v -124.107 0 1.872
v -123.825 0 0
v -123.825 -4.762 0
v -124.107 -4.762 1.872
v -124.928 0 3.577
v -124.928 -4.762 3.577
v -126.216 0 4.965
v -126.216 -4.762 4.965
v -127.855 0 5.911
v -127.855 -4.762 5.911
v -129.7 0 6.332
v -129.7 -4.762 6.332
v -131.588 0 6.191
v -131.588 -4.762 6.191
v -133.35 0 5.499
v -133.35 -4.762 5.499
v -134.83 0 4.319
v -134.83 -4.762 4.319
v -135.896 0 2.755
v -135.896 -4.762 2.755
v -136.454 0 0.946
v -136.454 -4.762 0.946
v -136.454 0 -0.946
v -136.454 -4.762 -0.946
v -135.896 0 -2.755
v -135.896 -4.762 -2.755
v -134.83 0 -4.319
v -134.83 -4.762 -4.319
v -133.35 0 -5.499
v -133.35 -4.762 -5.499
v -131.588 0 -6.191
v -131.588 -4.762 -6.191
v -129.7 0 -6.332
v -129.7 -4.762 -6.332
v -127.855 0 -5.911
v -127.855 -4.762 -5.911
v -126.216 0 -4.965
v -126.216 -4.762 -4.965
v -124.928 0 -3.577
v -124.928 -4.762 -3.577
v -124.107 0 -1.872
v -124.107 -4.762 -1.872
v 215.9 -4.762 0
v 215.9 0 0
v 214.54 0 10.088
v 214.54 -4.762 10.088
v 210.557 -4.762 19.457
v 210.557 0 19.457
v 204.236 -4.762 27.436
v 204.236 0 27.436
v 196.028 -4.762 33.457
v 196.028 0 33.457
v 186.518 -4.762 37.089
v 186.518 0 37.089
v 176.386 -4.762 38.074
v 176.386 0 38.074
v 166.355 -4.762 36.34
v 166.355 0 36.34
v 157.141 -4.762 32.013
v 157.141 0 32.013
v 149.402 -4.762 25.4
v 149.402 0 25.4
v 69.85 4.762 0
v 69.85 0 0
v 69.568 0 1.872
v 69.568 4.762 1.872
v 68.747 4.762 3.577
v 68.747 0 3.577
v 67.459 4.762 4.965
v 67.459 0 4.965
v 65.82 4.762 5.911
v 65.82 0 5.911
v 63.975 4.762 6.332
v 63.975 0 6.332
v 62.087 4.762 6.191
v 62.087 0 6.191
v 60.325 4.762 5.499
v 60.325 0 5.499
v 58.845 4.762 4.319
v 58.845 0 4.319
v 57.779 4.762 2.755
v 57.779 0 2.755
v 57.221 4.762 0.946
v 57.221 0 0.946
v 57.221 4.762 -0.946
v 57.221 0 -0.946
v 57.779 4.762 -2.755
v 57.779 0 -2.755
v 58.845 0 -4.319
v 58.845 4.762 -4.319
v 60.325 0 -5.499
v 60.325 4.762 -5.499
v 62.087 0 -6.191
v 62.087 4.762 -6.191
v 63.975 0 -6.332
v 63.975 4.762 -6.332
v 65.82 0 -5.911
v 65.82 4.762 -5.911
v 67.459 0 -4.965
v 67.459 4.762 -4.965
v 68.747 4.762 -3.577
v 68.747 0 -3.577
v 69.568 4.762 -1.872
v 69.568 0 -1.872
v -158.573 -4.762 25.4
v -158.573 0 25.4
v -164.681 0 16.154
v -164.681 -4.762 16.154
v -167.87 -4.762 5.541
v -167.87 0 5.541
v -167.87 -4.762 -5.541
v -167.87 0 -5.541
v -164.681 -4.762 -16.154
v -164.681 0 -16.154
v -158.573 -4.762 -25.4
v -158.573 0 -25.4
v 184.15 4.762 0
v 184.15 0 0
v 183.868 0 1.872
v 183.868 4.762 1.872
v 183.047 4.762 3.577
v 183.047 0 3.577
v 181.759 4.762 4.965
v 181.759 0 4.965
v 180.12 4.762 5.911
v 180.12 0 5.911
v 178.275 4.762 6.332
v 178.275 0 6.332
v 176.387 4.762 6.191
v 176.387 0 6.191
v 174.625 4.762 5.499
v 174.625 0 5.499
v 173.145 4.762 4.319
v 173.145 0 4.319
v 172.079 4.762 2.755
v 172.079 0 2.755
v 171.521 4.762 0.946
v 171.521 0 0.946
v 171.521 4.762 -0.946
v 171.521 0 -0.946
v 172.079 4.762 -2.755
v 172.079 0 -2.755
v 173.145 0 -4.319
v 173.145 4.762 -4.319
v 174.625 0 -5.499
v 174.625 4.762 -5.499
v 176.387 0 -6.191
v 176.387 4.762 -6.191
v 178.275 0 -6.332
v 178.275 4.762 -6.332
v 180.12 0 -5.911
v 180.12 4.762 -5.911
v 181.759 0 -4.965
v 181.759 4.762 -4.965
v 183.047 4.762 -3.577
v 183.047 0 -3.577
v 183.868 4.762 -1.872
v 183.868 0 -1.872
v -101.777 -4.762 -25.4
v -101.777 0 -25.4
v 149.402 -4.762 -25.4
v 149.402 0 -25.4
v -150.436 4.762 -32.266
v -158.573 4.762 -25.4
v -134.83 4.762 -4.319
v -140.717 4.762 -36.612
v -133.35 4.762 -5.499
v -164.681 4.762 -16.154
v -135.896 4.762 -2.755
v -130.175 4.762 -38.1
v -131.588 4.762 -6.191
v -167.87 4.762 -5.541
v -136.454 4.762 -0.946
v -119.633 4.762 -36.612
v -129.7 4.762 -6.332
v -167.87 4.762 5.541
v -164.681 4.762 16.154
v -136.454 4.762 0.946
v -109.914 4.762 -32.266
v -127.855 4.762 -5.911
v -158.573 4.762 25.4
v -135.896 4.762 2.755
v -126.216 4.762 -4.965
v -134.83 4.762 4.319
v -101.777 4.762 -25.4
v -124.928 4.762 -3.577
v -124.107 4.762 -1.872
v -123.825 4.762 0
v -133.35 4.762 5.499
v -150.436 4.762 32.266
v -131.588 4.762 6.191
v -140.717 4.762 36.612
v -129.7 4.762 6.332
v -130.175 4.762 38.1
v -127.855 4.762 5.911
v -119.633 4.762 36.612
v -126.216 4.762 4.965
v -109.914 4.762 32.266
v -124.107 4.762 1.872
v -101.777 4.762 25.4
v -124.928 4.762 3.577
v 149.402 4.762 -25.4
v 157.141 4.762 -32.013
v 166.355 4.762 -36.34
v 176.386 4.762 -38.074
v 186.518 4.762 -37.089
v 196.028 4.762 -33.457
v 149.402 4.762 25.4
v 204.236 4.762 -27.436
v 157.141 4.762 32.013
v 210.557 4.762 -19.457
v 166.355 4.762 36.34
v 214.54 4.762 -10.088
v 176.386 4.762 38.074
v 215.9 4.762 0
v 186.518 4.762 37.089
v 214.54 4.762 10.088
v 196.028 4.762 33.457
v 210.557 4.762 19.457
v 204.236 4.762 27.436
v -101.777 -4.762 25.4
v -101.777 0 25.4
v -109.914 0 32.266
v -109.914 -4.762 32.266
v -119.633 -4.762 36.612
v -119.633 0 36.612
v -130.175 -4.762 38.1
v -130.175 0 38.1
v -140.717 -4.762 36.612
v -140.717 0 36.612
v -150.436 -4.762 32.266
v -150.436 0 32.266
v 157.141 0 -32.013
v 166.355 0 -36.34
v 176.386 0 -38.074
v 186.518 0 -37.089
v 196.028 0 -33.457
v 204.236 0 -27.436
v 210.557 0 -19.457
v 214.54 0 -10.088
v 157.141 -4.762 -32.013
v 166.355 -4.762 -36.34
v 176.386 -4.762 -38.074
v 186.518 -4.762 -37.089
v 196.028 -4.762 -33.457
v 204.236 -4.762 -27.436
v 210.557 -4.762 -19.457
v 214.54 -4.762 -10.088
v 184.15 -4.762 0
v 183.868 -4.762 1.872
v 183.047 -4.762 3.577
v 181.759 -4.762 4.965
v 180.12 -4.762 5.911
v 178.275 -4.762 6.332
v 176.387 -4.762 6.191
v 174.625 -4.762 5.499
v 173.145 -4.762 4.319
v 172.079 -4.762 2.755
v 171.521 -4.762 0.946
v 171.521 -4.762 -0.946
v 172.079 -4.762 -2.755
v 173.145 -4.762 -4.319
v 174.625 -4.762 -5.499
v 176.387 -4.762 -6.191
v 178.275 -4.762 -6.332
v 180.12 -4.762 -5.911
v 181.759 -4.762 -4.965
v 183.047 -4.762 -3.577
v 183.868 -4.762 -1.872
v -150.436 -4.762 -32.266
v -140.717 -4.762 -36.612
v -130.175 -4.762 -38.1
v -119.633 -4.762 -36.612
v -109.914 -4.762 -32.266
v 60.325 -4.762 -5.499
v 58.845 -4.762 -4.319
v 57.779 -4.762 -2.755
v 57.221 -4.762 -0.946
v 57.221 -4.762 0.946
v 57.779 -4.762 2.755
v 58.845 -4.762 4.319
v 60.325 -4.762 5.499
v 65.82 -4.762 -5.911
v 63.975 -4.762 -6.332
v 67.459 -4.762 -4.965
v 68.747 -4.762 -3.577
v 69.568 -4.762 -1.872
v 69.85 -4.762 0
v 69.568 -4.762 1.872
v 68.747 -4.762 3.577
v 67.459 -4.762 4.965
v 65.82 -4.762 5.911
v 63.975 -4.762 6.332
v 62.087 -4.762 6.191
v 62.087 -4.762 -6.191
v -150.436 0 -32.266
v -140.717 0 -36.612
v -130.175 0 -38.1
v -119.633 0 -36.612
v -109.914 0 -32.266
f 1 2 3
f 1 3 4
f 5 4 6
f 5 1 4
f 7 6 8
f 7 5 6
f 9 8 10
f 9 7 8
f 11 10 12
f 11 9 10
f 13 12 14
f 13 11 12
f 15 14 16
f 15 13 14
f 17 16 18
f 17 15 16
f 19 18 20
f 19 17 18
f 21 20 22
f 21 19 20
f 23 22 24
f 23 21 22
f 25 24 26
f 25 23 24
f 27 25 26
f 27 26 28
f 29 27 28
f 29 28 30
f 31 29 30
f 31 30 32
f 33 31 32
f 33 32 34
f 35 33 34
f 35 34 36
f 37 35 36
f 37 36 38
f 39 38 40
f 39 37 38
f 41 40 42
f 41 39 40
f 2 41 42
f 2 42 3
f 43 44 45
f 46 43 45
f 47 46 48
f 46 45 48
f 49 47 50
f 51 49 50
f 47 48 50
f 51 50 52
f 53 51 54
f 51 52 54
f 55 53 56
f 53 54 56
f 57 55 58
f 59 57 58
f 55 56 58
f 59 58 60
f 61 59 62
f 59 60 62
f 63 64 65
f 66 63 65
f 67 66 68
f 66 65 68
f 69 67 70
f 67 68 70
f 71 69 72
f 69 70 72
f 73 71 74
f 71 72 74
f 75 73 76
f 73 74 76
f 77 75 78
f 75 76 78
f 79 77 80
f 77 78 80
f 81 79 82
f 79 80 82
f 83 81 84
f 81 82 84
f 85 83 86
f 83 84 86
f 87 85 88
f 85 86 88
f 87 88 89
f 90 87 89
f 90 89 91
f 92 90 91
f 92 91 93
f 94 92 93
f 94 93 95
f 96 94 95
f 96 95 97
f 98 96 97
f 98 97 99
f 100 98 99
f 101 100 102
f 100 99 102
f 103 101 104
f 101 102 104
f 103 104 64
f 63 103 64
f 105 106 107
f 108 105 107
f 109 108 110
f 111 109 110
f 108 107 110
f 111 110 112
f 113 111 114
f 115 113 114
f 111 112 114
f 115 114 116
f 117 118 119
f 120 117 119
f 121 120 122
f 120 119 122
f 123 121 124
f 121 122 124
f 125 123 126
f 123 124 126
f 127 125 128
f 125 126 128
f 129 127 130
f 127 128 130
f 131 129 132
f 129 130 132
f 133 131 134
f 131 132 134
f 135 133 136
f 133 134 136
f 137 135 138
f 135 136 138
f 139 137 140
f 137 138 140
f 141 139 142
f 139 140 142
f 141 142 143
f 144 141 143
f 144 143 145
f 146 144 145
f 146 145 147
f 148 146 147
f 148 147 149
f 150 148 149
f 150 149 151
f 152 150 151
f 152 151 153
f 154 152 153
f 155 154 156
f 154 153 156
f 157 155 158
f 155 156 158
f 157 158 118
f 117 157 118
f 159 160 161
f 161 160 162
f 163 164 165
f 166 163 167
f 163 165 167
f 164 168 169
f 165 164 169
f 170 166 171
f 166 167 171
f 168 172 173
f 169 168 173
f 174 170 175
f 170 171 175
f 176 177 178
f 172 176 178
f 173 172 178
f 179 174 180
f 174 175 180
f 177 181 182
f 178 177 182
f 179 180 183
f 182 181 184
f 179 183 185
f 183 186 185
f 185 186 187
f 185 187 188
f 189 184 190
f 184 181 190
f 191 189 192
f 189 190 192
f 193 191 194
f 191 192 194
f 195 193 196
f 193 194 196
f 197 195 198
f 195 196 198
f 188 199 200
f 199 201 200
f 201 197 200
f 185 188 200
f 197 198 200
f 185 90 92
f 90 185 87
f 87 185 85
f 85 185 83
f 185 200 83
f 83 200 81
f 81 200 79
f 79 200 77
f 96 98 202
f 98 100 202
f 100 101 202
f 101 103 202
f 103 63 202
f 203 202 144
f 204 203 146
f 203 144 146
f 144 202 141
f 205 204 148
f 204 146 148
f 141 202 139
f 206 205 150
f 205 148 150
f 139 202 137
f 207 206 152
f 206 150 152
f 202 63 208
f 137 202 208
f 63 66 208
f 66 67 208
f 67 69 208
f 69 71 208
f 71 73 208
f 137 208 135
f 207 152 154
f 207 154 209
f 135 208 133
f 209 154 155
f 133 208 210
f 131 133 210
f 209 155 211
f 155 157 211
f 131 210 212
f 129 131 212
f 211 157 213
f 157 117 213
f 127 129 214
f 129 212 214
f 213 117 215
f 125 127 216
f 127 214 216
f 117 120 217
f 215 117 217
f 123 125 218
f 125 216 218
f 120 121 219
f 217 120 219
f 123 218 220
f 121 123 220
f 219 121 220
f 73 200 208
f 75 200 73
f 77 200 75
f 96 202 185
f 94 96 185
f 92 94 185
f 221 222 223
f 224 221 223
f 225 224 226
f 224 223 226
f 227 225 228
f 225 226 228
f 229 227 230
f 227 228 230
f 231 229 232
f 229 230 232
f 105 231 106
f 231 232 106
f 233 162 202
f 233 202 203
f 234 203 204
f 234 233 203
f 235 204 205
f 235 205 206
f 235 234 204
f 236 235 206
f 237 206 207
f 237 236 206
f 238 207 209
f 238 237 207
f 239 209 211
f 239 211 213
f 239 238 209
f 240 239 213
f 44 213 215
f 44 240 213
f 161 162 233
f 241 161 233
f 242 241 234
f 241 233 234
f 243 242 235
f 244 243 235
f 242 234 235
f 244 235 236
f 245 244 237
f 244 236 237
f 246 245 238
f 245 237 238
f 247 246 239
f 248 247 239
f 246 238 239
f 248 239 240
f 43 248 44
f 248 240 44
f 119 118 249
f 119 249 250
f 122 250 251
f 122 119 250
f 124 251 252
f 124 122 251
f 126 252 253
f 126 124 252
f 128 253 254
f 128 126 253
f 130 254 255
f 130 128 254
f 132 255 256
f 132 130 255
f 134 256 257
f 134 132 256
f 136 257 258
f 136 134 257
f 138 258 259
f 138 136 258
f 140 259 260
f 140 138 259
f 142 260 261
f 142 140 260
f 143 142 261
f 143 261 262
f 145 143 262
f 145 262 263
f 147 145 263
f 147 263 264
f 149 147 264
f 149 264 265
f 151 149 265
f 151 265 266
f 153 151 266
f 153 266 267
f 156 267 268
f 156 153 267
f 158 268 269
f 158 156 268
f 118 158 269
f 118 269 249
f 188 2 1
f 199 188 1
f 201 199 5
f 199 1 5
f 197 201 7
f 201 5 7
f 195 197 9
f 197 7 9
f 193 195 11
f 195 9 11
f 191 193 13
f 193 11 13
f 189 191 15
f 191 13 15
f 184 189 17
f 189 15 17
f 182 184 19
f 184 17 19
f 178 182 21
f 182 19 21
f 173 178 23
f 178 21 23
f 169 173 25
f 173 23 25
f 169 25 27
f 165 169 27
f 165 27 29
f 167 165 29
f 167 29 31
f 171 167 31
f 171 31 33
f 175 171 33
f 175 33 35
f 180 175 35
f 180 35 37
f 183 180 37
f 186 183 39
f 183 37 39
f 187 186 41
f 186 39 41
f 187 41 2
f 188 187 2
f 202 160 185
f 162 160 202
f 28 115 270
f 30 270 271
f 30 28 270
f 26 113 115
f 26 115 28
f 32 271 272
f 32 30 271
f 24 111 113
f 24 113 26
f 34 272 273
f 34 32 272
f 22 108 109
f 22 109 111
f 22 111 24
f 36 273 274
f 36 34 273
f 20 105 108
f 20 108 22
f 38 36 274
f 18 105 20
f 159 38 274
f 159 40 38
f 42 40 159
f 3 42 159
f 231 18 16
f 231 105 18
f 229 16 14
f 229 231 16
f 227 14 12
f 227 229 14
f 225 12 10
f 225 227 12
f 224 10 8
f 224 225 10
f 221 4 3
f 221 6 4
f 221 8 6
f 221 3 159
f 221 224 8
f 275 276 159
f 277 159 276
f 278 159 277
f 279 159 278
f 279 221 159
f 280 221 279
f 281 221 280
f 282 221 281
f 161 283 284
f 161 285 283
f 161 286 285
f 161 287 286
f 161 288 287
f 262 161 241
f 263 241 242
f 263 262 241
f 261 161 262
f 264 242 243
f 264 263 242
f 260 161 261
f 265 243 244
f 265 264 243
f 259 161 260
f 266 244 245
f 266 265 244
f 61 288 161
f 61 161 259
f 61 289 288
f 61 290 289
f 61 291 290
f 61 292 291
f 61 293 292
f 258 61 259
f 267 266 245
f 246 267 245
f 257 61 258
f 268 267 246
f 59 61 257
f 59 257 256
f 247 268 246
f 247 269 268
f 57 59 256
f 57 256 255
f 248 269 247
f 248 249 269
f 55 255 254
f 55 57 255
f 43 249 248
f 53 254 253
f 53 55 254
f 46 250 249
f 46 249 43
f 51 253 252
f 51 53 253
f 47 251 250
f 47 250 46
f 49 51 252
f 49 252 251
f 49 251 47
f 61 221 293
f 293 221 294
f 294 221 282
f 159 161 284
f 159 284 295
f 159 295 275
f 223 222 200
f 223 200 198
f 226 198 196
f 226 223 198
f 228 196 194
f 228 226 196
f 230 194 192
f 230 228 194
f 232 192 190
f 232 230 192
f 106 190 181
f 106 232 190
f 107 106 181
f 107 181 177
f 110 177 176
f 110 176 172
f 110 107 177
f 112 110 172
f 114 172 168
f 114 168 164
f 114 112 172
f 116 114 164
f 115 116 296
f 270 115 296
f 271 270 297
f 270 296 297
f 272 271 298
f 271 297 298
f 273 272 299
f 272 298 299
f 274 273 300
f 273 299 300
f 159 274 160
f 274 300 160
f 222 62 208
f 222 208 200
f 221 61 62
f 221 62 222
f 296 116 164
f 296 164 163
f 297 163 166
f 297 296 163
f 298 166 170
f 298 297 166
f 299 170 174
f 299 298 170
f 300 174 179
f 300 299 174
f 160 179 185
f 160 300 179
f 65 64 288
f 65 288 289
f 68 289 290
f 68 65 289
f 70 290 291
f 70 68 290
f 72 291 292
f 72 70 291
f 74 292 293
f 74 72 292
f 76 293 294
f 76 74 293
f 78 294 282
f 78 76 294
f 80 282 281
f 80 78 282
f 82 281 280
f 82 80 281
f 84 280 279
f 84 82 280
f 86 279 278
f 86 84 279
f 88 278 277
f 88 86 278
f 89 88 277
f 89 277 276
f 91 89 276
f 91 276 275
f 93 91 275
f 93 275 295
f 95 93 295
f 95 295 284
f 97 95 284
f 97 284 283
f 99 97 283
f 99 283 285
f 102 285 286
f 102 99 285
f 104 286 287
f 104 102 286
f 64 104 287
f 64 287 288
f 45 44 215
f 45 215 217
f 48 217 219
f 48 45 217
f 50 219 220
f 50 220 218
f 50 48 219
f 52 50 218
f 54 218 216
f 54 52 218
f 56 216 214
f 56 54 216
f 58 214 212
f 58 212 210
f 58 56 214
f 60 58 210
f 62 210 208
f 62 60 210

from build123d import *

# Parameters (mm, degrees)
F0_R     = 6.35
F1_DEPTH = 4.7625


with BuildPart() as f1:
    # F0 (on Front) → F1 (new body, symmetric)
    with BuildSketch(Plane.XZ):
        with BuildLine():
            Line((-101.7769366858, -25.4), (149.4019366858, -25.4))
            ThreePointArc((149.4019366858, -25.4), (139.7, 0), (149.4019366858, 25.4))
            Line((149.4019366858, 25.4), (-101.7769366858, 25.4))
            ThreePointArc((-101.7769366858, 25.4), (-94.5830331235, 13.5949216204), (-92.075, 0))
            ThreePointArc((-92.075, 0), (-94.5830331235, -13.5949216204), (-101.7769366858, -25.4))
        make_face()
        with Locations((63.5, 0)):
            Circle(F0_R, mode=Mode.SUBTRACT)
        with BuildLine():
            Line((-130.175, -25.4), (-101.7769366858, -25.4))
            ThreePointArc((-101.7769366858, -25.4), (-94.5830331235, -13.5949216204), (-92.075, 0))
            ThreePointArc((-92.075, 0), (-94.5830331235, 13.5949216204), (-101.7769366858, 25.4))
            Line((-101.7769366858, 25.4), (-130.175, 25.4))
            ThreePointArc((-130.175, 25.4), (-112.2144877579, 17.9605122421), (-104.775, 0))
            ThreePointArc((-104.775, 0), (-112.2144877579, -17.9605122421), (-130.175, -25.4))
        make_face()
        with BuildLine():
            ThreePointArc((-130.175, 25.4), (-155.575, 0), (-130.175, -25.4))
            ThreePointArc((-130.175, -25.4), (-112.2144877579, -17.9605122421), (-104.775, 0))
            ThreePointArc((-104.775, 0), (-112.2144877579, 17.9605122421), (-130.175, 25.4))
        make_face()
        with Locations((-130.175, 0)):
            Circle(F0_R, mode=Mode.SUBTRACT)
        with BuildLine():
            Line((-130.175, 25.4), (-101.7769366858, 25.4))
            ThreePointArc((-101.7769366858, 25.4), (-130.175, 38.1), (-158.5730633142, 25.4))
            Line((-158.5730633142, 25.4), (-130.175, 25.4))
        make_face()
        with BuildLine():
            Line((-158.5730633142, -25.4), (-130.175, -25.4))
            ThreePointArc((-130.175, -25.4), (-155.575, 0), (-130.175, 25.4))
            Line((-130.175, 25.4), (-158.5730633142, 25.4))
            ThreePointArc((-158.5730633142, 25.4), (-168.275, 0), (-158.5730633142, -25.4))
        make_face()
        with BuildLine():
            ThreePointArc((-158.5730633142, -25.4), (-130.175, -38.1), (-101.7769366858, -25.4))
            Line((-101.7769366858, -25.4), (-130.175, -25.4))
            Line((-130.175, -25.4), (-158.5730633142, -25.4))
        make_face()
        with BuildLine():
            Line((203.2, 25.4), (203.2, -25.4))
            Line((203.2, -25.4), (149.4019366858, -25.4))
            ThreePointArc((149.4019366858, -25.4), (191.3949216204, -35.5919668765), (215.9, 0))
            ThreePointArc((215.9, 0), (191.3949216204, 35.5919668765), (149.4019366858, 25.4))
            Line((149.4019366858, 25.4), (203.2, 25.4))
        make_face()
        with BuildLine():
            Line((149.4019366858, -25.4), (203.2, -25.4))
            Line((203.2, -25.4), (203.2, 25.4))
            Line((203.2, 25.4), (149.4019366858, 25.4))
            ThreePointArc((149.4019366858, 25.4), (139.7, 0), (149.4019366858, -25.4))
        make_face()
        with Locations((177.8, 0)):
            Circle(F0_R, mode=Mode.SUBTRACT)
    extrude(amount=F1_DEPTH, both=True)


solid = f1.part
